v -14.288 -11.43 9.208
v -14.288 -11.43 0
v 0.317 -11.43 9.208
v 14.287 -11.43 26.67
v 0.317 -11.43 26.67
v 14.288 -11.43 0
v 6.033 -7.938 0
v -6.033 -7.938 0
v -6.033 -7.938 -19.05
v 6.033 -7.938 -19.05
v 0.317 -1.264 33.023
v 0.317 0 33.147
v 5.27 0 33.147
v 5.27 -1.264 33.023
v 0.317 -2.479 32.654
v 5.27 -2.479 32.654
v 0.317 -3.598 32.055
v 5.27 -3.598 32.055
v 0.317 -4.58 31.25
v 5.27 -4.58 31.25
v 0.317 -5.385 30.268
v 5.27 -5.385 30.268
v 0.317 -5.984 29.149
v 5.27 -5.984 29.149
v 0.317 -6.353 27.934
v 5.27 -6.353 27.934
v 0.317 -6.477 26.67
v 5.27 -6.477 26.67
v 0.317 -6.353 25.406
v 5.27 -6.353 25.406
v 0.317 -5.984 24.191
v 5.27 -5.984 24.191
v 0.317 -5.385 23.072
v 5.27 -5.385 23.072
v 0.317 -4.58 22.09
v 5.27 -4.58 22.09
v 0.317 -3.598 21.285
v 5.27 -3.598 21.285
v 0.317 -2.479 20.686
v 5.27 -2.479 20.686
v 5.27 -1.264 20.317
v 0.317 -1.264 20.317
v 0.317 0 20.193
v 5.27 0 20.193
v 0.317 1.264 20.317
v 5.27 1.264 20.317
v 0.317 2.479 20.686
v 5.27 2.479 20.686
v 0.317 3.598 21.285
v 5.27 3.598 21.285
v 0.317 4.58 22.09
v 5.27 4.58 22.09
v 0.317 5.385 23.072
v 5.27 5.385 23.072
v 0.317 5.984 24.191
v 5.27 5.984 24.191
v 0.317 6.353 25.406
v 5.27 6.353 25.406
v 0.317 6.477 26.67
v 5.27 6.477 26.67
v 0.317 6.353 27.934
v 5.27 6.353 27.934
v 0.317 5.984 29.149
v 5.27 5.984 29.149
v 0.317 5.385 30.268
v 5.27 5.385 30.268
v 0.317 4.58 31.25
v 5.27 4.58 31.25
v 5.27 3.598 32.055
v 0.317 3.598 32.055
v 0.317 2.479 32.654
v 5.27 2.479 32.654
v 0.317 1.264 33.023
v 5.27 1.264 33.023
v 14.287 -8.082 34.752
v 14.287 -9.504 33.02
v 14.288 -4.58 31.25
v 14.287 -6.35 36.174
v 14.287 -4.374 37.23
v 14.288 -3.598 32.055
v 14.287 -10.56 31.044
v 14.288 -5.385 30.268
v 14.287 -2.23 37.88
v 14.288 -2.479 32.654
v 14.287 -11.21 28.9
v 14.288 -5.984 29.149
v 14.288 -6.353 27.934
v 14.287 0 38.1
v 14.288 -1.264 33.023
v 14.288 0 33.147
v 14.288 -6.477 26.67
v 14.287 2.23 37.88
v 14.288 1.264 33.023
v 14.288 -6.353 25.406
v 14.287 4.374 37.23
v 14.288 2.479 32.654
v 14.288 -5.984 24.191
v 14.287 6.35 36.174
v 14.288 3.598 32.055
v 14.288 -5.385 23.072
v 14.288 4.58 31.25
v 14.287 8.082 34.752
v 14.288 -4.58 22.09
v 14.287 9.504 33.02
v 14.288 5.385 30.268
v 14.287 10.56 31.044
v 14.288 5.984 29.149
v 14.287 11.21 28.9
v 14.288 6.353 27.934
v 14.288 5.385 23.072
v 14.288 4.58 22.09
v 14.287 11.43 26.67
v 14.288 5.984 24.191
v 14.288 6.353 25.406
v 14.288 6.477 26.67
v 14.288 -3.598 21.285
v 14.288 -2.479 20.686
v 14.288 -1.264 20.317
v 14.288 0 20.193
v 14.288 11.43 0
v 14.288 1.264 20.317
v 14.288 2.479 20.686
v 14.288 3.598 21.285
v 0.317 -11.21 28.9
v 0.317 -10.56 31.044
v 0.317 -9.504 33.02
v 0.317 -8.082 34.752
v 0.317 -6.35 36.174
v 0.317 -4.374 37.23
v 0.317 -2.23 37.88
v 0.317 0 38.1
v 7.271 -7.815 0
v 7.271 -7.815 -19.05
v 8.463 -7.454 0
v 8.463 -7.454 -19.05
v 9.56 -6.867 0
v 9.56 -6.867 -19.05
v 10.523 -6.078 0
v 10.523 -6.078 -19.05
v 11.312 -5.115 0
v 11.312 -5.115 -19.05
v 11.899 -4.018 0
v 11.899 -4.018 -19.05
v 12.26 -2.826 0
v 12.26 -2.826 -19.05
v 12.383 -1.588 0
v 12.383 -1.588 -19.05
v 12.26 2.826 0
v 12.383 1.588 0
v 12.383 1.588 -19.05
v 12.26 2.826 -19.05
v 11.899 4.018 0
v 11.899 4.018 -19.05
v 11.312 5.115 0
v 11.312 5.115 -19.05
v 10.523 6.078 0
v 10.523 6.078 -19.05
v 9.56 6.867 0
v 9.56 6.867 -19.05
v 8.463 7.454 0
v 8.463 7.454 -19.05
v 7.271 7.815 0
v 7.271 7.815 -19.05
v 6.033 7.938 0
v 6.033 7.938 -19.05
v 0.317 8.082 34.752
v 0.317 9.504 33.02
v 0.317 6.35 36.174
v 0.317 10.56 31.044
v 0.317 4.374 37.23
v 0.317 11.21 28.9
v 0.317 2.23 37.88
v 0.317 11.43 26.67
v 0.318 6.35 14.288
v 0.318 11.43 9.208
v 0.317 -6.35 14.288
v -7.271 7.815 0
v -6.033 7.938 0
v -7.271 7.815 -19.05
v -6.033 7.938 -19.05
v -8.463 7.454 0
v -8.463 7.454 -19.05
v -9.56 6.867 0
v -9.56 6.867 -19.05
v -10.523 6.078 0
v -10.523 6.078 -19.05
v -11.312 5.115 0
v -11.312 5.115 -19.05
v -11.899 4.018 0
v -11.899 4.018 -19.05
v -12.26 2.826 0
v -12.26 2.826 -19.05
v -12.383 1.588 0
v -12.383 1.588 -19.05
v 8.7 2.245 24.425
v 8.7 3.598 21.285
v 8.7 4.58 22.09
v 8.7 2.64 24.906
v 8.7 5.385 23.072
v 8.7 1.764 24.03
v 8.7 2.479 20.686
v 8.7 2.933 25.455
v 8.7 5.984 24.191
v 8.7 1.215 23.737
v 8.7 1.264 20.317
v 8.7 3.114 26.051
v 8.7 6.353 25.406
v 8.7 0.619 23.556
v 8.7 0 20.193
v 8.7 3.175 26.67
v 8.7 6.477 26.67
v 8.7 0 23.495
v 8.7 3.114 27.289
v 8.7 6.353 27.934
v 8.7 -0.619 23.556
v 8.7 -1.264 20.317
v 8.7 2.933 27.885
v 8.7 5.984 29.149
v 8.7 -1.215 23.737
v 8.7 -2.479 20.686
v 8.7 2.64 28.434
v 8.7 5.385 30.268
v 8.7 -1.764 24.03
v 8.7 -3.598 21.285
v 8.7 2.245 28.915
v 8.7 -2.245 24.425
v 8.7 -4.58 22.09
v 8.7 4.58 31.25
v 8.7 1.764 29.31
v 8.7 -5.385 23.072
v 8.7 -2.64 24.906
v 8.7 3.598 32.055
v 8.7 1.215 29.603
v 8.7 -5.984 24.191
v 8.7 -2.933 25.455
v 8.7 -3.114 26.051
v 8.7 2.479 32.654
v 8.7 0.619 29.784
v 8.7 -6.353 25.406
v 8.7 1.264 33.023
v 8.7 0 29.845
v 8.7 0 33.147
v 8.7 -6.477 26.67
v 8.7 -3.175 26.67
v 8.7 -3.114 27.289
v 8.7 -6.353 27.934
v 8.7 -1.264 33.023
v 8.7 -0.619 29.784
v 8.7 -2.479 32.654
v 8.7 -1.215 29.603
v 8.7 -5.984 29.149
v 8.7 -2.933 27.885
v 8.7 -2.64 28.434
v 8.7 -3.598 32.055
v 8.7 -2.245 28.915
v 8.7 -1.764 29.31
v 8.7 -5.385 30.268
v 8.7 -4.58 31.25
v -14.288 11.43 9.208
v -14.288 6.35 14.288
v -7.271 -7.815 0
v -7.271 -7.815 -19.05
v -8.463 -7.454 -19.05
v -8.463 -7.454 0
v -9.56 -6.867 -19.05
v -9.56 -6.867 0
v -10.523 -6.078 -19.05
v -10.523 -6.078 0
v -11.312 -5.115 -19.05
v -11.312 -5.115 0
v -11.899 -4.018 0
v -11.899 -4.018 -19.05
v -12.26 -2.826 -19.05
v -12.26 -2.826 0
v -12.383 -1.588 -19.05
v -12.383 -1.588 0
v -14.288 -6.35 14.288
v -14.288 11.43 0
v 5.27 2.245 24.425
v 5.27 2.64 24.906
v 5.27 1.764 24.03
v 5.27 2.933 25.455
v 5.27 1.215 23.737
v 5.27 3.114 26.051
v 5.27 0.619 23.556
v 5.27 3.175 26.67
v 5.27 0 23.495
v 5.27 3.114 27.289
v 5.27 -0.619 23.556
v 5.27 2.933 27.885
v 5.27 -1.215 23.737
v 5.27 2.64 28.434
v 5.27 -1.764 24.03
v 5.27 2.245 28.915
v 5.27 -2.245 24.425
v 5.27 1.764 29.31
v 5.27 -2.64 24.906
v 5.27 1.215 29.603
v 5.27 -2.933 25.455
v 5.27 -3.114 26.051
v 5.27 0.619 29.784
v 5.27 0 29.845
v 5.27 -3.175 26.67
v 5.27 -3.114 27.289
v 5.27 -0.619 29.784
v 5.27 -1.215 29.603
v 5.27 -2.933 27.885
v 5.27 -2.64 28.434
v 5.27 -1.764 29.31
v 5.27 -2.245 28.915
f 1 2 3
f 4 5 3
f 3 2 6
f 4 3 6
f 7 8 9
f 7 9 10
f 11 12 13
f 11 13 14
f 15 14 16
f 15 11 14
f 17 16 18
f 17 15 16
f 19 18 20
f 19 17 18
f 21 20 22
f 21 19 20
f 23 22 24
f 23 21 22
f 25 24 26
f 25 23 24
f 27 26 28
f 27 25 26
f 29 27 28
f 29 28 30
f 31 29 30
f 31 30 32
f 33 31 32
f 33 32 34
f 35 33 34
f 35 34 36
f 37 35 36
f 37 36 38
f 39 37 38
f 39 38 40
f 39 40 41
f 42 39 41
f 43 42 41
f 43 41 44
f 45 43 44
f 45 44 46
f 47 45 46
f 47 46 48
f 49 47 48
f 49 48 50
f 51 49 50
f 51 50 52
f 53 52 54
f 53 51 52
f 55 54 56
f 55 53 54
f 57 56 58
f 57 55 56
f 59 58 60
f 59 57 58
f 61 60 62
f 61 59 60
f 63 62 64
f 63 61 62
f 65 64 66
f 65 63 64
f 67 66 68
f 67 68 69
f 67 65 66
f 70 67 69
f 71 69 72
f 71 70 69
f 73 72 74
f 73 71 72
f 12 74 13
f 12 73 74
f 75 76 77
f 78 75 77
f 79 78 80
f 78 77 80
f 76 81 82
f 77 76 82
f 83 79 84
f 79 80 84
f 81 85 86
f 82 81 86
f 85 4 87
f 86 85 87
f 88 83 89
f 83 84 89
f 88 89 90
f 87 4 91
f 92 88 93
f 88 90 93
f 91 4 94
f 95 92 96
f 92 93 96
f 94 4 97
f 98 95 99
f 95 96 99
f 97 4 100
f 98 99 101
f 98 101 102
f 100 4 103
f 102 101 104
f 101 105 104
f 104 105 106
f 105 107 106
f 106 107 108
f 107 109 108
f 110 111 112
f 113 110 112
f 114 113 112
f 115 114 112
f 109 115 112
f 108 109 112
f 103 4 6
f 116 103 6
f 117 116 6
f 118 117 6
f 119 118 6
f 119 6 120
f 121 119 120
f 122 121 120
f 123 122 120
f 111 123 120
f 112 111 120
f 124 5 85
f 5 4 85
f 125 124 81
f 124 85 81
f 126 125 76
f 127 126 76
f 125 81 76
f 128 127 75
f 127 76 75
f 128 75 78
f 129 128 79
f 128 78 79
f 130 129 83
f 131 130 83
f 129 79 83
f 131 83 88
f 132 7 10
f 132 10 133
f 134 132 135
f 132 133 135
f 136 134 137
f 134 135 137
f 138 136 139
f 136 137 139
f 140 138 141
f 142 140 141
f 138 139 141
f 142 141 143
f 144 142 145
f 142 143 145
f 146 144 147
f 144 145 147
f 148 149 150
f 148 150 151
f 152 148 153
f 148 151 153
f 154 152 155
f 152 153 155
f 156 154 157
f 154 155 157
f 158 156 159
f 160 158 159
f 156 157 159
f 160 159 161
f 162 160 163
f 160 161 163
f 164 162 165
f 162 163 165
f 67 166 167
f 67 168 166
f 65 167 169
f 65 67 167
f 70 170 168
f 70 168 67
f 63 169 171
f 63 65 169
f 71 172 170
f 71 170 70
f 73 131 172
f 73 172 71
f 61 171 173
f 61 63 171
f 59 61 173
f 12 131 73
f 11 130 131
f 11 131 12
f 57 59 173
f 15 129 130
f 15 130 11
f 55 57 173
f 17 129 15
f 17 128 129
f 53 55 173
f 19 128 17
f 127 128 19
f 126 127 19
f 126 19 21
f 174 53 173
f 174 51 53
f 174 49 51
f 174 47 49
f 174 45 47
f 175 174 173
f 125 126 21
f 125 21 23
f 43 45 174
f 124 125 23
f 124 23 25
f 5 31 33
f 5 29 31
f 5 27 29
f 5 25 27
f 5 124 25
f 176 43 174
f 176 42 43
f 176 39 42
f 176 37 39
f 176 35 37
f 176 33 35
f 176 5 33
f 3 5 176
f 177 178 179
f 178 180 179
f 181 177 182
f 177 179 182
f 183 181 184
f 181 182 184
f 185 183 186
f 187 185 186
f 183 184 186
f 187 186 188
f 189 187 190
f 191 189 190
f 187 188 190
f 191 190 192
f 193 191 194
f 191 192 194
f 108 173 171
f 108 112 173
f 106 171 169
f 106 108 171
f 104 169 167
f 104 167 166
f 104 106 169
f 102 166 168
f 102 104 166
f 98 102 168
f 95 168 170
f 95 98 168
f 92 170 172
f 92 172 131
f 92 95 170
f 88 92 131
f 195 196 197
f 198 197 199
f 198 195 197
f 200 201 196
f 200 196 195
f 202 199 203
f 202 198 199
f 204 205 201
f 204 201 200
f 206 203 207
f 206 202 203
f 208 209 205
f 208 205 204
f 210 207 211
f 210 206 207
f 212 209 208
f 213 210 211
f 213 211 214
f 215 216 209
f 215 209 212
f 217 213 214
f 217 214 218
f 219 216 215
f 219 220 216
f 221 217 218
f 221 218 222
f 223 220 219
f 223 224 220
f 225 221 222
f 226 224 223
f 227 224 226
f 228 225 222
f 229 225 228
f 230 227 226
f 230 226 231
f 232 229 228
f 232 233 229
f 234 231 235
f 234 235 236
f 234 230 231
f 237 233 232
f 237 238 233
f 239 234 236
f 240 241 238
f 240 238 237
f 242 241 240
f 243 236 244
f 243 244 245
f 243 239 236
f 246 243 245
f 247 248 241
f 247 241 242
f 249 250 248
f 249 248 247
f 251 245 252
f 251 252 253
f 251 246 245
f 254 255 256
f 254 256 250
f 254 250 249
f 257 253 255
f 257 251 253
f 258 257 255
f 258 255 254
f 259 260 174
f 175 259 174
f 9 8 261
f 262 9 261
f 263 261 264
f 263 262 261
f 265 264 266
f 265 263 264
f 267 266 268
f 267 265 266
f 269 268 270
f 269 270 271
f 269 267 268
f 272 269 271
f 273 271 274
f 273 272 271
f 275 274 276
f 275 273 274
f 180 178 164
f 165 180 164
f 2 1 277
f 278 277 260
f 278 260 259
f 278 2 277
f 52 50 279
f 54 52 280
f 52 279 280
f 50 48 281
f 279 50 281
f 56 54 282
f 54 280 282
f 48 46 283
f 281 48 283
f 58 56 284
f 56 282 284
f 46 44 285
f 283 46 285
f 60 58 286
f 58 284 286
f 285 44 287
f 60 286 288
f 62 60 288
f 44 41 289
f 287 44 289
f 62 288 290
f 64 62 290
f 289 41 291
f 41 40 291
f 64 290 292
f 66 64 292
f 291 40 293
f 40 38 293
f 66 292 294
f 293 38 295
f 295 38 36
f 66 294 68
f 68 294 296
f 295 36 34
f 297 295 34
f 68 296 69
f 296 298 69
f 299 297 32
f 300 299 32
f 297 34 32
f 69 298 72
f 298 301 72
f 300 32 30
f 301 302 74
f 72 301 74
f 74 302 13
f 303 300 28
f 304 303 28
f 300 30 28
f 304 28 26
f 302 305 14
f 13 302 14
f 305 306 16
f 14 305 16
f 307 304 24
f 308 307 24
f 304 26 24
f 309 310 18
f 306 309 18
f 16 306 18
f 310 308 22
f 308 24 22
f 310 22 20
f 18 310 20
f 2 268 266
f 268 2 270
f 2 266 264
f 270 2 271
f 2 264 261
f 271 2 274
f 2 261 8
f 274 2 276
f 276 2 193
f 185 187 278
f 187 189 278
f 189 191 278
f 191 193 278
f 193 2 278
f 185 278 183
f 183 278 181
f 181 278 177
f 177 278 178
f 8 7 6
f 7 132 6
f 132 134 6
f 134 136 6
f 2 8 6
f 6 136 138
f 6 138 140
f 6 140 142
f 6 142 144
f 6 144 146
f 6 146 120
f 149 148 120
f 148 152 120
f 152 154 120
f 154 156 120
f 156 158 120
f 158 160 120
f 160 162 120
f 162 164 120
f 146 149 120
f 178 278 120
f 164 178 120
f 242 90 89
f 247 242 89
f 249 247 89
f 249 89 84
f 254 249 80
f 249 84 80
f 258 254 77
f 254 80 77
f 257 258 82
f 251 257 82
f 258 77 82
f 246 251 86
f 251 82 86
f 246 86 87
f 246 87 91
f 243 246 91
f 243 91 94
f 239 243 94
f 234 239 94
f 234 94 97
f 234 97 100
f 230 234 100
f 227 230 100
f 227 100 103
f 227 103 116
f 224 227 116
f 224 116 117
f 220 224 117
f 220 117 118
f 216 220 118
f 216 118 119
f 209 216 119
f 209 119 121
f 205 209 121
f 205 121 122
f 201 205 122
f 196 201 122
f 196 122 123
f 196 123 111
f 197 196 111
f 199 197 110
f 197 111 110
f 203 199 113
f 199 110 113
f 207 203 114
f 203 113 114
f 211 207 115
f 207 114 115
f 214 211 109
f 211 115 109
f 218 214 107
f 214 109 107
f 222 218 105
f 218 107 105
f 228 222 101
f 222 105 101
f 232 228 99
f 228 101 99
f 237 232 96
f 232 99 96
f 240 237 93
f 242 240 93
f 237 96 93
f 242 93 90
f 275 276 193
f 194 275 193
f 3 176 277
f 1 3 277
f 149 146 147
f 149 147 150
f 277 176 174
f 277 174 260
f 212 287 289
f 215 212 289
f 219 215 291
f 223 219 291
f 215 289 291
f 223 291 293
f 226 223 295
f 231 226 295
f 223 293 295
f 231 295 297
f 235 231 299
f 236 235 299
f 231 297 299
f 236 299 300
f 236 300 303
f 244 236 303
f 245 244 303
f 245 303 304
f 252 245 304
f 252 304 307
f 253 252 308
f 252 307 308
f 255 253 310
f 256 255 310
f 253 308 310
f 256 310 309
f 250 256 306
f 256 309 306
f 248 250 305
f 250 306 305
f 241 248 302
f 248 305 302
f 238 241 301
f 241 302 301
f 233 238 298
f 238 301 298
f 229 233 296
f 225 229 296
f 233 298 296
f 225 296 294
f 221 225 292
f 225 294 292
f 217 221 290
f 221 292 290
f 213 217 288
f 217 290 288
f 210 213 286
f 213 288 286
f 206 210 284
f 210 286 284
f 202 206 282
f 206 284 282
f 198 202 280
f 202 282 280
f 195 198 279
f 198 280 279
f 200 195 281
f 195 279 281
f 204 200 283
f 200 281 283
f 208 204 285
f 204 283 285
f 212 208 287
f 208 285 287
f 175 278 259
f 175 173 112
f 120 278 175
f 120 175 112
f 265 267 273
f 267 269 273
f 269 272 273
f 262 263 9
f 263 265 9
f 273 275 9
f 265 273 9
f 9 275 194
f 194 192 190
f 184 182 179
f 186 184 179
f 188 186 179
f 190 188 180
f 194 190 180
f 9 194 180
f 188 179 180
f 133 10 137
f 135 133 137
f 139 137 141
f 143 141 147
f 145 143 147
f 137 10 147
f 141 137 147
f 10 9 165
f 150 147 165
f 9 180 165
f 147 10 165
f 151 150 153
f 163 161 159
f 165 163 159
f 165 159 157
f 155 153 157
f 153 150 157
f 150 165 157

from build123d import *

# Parameters (mm, degrees)
SKETCH2_W                                            = 24.765
SKETCH2_H                                            = 15.875
BOSS_EXTRUDE1_DEPTH                                  = 19.05
SKETCH3_W                                            = 28.575
SKETCH3_H                                            = 22.86
BOSS_EXTRUDE2_DEPTH                                  = 38.1
SKETCH4_W                                            = 14.605
SKETCH4_H                                            = 23.8125
CUT_EXTRUDE1_DEPTH                                   = 47.6725
FILLET5_R                                            = 11.43
FILLET3_R                                            = 6.35
CHAMFER1_SIZE                                        = 5.08
CBORE_FOR_1_4_FILLISTER_HEAD_MACHINE_SCR_D           = 6.35
CBORE_FOR_1_4_FILLISTER_HEAD_MACHINE_SCR_CBORE_D     = 12.954
CBORE_FOR_1_4_FILLISTER_HEAD_MACHINE_SCR_CBORE_DEPTH = 5.588


with BuildPart() as part:
    # Sketch2 → Boss-Extrude1 (new body)
    with BuildSketch(Plane.XY):
        Rectangle(SKETCH2_W, SKETCH2_H)
    extrude(amount=-BOSS_EXTRUDE1_DEPTH)

    # Sketch3 → Boss-Extrude2 (add)
    with BuildSketch(Plane.XY):
        Rectangle(SKETCH3_W, SKETCH3_H)
    extrude(amount=BOSS_EXTRUDE2_DEPTH)

    # Sketch4 → Cut-Extrude1 (cut, through all)
    with BuildSketch(Plane(origin=(0, -11.43, 0), x_dir=(-1, 0, 0), z_dir=(0, -1, 0))):
        with Locations((6.985, -26.19375)):
            Rectangle(SKETCH4_W, SKETCH4_H)
    extrude(amount=-CUT_EXTRUDE1_DEPTH, mode=Mode.SUBTRACT)

    # Fillet5
    fillet5_edges = [part.edges().sort_by_distance(p)[0] for p in [
        (7.3025, -11.43, 38.1),
        (7.3025, 11.43, 38.1),
    ]]
    fillet(fillet5_edges, radius=FILLET5_R - 0.0001)  # a hair under: the kernel refuses the full size

    # Fillet3
    fillet3_edges = [part.edges().sort_by_distance(p)[0] for p in [
        (-12.3825, 7.9375, -9.525),
        (12.3825, 7.9375, -9.525),
        (12.3825, -7.9375, -9.525),
        (-12.3825, -7.9375, -9.525),
    ]]
    fillet(fillet3_edges, radius=FILLET3_R)

    # Chamfer1
    chamfer1_edges = [part.edges().sort_by_distance(p)[0] for p in [
        (-6.985, 11.43, 14.2875),
        (-6.985, -11.43, 14.2875),
    ]]
    chamfer(chamfer1_edges, length=CHAMFER1_SIZE)

    # CBORE for 1/4 Fillister Head Machine Screw1 (through all)
    with Locations(Plane(origin=(14.2875, 0, 26.67), x_dir=(0, 0, 1), z_dir=(1, 0, 0))):
        with Locations((0, 0)):
            cbore_for_1_4_fillister_head_machine_scr = CounterBoreHole(CBORE_FOR_1_4_FILLISTER_HEAD_MACHINE_SCR_D / 2, CBORE_FOR_1_4_FILLISTER_HEAD_MACHINE_SCR_CBORE_D / 2, CBORE_FOR_1_4_FILLISTER_HEAD_MACHINE_SCR_CBORE_DEPTH)

    # Mirror1: CBORE for 1/4 Fillister Head Machine Screw1 across plane
    add(cbore_for_1_4_fillister_head_machine_scr.mirror(Plane(origin=(6.985, 0, 0), x_dir=(0, 0, 1), z_dir=(1, 0, 0))), mode=Mode.SUBTRACT)


solid = part.part
